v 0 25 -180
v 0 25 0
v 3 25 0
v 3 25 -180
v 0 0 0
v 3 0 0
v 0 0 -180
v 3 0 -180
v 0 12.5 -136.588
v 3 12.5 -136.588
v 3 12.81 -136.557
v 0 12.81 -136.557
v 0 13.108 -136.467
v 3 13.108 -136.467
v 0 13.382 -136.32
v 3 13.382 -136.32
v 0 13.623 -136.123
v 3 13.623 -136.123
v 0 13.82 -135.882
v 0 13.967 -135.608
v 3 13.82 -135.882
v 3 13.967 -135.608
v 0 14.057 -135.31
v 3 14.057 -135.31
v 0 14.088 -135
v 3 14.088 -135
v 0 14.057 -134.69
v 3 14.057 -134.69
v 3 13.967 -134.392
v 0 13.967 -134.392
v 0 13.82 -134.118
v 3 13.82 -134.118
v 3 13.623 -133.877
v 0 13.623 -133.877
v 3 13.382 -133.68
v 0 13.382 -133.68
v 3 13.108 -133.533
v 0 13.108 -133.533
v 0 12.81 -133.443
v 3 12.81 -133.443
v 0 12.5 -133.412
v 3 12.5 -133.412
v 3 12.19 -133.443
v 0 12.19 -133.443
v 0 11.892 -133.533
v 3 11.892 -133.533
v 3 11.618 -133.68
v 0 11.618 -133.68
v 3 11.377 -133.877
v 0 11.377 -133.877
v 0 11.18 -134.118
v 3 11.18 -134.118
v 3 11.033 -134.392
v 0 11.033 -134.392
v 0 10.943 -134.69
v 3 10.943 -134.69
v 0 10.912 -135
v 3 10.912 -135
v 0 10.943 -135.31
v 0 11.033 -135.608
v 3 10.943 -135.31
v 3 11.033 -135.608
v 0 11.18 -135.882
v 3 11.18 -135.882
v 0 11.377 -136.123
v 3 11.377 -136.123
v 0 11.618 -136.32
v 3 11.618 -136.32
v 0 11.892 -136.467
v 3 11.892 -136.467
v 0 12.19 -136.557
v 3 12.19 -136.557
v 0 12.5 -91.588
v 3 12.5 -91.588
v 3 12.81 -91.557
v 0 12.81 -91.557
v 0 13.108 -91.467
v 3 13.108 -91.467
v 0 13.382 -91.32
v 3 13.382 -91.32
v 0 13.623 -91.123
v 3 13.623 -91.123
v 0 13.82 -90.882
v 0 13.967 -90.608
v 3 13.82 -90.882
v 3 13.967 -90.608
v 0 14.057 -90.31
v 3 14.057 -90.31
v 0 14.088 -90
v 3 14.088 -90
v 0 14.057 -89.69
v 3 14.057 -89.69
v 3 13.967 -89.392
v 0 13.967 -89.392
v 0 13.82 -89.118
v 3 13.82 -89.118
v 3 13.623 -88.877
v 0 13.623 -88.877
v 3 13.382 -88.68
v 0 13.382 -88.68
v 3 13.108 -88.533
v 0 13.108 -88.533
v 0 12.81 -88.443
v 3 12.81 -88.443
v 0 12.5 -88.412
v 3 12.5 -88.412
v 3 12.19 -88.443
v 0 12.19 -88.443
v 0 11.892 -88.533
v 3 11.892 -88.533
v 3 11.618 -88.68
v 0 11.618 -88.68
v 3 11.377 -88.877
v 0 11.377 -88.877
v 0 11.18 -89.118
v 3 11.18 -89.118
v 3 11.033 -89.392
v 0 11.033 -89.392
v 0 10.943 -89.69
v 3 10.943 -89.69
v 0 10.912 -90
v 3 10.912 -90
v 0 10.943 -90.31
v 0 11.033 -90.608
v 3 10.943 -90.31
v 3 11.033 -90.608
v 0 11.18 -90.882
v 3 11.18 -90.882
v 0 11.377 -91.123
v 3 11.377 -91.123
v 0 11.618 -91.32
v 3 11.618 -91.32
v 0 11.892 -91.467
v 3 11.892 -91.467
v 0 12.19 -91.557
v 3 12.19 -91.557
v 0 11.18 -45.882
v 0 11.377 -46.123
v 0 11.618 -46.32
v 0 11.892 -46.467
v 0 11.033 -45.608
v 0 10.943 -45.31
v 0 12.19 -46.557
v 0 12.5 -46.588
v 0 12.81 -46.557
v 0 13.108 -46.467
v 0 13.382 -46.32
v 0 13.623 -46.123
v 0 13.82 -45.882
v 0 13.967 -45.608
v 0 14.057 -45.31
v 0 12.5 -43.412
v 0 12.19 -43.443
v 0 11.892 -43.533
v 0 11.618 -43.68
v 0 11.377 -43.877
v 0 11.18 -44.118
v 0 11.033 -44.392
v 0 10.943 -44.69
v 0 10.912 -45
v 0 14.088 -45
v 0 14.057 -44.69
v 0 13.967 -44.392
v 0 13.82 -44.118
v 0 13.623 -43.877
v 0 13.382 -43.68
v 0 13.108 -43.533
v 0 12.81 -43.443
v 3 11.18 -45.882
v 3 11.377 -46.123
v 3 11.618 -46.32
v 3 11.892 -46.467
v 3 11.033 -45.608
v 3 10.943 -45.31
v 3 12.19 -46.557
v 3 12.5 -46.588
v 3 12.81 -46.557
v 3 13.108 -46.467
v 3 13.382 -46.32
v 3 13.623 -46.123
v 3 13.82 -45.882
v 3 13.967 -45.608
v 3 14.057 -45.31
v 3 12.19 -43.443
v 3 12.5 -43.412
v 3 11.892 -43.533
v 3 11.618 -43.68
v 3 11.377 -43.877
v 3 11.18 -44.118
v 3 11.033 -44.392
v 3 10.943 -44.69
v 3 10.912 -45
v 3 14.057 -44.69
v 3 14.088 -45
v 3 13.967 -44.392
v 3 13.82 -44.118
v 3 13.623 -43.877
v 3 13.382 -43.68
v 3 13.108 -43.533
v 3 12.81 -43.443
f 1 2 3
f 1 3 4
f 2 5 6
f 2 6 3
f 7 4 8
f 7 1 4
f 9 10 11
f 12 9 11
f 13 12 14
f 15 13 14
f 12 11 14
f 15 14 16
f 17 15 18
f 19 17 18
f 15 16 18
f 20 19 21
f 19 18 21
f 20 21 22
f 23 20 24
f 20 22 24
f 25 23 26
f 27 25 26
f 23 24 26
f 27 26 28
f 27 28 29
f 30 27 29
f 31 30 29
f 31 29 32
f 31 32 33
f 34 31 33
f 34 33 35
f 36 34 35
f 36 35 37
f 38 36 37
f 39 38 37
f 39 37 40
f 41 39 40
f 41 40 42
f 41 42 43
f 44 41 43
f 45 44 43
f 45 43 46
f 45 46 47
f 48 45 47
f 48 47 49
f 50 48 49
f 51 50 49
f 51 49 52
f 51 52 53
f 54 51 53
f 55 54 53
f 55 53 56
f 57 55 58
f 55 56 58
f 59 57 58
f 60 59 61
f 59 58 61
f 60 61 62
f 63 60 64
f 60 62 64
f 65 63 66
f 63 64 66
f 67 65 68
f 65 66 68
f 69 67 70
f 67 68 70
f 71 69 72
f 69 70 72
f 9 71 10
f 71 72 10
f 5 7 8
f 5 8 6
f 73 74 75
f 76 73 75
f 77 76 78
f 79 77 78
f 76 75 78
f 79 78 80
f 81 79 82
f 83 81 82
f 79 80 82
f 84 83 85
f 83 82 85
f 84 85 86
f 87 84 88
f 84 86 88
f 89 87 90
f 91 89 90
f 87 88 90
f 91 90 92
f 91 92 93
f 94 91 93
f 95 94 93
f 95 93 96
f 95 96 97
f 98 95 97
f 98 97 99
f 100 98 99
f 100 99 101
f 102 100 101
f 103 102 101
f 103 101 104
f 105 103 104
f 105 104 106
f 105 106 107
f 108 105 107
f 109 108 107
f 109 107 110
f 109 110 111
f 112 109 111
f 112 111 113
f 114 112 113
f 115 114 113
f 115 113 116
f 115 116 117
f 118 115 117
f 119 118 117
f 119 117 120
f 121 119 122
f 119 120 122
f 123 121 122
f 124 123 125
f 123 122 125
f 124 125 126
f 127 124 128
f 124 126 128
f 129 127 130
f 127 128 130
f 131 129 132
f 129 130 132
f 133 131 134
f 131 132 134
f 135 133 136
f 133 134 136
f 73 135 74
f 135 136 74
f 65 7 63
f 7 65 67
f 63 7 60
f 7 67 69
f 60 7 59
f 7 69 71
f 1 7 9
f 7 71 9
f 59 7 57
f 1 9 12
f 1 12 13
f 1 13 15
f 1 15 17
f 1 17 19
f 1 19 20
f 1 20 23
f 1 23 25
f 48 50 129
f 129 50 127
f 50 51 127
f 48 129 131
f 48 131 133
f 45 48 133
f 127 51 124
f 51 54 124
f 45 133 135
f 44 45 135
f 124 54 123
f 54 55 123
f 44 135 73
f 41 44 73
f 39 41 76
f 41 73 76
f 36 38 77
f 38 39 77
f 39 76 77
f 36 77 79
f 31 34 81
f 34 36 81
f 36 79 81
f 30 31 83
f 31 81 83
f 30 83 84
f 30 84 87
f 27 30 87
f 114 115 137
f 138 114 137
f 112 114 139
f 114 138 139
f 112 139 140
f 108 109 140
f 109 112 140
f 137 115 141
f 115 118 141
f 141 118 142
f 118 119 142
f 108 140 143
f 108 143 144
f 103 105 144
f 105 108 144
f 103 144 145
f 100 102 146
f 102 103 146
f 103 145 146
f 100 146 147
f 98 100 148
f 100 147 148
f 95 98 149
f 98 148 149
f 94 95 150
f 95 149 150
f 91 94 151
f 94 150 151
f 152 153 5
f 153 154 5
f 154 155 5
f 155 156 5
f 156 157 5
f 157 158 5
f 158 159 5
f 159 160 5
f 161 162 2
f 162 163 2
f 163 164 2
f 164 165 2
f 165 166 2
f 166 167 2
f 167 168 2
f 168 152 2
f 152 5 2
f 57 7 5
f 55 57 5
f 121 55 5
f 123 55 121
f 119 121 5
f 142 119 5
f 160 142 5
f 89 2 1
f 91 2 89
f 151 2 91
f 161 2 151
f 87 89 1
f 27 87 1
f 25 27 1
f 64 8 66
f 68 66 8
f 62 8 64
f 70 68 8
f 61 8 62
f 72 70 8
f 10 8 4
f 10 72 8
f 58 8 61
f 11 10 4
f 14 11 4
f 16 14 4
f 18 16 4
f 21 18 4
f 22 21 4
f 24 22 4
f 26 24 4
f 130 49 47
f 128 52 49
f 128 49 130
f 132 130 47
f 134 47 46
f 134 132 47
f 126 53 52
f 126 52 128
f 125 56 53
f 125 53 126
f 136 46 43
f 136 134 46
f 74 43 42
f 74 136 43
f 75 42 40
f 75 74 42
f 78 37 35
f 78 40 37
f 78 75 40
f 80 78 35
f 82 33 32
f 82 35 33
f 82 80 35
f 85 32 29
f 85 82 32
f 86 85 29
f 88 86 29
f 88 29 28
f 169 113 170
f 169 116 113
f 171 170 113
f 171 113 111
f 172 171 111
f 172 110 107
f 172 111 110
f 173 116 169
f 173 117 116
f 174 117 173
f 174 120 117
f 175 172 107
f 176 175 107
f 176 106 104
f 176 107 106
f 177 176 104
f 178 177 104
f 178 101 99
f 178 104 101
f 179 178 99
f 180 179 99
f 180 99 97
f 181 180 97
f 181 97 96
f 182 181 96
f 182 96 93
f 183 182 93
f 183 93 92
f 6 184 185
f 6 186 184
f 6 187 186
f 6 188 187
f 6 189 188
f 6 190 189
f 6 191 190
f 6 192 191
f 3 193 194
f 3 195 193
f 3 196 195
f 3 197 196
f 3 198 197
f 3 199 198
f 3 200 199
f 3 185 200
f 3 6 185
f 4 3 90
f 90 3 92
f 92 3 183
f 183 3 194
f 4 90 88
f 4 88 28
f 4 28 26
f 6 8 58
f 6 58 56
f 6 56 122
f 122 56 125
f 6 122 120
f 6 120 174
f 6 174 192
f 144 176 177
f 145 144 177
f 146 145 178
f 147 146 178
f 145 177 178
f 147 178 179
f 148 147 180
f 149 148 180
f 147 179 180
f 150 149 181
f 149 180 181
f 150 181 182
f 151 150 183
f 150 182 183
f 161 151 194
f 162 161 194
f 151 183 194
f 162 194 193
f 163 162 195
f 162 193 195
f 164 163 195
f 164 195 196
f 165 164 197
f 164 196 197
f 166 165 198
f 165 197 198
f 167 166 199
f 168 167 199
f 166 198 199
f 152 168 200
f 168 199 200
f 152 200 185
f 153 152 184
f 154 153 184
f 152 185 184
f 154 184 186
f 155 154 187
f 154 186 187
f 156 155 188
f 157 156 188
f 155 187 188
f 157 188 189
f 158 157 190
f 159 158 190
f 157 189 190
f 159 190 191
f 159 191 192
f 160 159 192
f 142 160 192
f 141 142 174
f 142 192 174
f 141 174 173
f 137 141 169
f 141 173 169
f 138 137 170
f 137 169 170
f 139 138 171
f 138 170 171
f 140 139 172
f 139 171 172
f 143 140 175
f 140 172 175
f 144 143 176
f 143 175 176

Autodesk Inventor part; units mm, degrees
ref_plane "YZ Plane" through (0, 0, 0) normal (1, 0, 0) x (0, 1, 0)
ref_plane "XZ Plane" through (0, 0, 0) normal (0, 1, 0) x (-1, 0, 0)
ref_plane "XY Plane" through (0, 0, 0) normal (0, 0, 1) x (1, 0, 0)
sketch "Boceto1" plane through (0, 0, 0) normal (1, 0, 0) x (0, 1, 0)
  line L0 (0, 0) -> (25, 0)
  line L1 (25, 0) -> (25, -180)
  line L2 (25, -180) -> (0, -180)
  line L3 (0, -180) -> (0, 0)
  dimension "d0" = 25
  dimension "d1" = 180
extrude "Extrusión1" add sketch "Boceto1" along normal blind 3
sketch "Boceto2" plane through (3, 0, 0) normal (1, 0, 0) x (0, 0, -1)
  line L0 (180, 0) -> (180, 25) projected
  line L1 (180, 25) -> (0, 25) projected
  line L2 (0, 25) -> (0, 0) projected
  line L3 (0, 0) -> (180, 0) projected
  circle A0 centre (45, 12.5) radius 1.5875
  circle A1 centre (90, 12.5) radius 1.5875
  circle A2 centre (135, 12.5) radius 1.5875
  dimension "d4" = 3.175
  dimension "d5" = 45
  dimension "d8" = 45
  dimension "d15" = 45
extrude "Extrusión2" cut sketch "Boceto2" against normal blind 3 contours A0 | A1 | A2
properties part number "Pestaña"
